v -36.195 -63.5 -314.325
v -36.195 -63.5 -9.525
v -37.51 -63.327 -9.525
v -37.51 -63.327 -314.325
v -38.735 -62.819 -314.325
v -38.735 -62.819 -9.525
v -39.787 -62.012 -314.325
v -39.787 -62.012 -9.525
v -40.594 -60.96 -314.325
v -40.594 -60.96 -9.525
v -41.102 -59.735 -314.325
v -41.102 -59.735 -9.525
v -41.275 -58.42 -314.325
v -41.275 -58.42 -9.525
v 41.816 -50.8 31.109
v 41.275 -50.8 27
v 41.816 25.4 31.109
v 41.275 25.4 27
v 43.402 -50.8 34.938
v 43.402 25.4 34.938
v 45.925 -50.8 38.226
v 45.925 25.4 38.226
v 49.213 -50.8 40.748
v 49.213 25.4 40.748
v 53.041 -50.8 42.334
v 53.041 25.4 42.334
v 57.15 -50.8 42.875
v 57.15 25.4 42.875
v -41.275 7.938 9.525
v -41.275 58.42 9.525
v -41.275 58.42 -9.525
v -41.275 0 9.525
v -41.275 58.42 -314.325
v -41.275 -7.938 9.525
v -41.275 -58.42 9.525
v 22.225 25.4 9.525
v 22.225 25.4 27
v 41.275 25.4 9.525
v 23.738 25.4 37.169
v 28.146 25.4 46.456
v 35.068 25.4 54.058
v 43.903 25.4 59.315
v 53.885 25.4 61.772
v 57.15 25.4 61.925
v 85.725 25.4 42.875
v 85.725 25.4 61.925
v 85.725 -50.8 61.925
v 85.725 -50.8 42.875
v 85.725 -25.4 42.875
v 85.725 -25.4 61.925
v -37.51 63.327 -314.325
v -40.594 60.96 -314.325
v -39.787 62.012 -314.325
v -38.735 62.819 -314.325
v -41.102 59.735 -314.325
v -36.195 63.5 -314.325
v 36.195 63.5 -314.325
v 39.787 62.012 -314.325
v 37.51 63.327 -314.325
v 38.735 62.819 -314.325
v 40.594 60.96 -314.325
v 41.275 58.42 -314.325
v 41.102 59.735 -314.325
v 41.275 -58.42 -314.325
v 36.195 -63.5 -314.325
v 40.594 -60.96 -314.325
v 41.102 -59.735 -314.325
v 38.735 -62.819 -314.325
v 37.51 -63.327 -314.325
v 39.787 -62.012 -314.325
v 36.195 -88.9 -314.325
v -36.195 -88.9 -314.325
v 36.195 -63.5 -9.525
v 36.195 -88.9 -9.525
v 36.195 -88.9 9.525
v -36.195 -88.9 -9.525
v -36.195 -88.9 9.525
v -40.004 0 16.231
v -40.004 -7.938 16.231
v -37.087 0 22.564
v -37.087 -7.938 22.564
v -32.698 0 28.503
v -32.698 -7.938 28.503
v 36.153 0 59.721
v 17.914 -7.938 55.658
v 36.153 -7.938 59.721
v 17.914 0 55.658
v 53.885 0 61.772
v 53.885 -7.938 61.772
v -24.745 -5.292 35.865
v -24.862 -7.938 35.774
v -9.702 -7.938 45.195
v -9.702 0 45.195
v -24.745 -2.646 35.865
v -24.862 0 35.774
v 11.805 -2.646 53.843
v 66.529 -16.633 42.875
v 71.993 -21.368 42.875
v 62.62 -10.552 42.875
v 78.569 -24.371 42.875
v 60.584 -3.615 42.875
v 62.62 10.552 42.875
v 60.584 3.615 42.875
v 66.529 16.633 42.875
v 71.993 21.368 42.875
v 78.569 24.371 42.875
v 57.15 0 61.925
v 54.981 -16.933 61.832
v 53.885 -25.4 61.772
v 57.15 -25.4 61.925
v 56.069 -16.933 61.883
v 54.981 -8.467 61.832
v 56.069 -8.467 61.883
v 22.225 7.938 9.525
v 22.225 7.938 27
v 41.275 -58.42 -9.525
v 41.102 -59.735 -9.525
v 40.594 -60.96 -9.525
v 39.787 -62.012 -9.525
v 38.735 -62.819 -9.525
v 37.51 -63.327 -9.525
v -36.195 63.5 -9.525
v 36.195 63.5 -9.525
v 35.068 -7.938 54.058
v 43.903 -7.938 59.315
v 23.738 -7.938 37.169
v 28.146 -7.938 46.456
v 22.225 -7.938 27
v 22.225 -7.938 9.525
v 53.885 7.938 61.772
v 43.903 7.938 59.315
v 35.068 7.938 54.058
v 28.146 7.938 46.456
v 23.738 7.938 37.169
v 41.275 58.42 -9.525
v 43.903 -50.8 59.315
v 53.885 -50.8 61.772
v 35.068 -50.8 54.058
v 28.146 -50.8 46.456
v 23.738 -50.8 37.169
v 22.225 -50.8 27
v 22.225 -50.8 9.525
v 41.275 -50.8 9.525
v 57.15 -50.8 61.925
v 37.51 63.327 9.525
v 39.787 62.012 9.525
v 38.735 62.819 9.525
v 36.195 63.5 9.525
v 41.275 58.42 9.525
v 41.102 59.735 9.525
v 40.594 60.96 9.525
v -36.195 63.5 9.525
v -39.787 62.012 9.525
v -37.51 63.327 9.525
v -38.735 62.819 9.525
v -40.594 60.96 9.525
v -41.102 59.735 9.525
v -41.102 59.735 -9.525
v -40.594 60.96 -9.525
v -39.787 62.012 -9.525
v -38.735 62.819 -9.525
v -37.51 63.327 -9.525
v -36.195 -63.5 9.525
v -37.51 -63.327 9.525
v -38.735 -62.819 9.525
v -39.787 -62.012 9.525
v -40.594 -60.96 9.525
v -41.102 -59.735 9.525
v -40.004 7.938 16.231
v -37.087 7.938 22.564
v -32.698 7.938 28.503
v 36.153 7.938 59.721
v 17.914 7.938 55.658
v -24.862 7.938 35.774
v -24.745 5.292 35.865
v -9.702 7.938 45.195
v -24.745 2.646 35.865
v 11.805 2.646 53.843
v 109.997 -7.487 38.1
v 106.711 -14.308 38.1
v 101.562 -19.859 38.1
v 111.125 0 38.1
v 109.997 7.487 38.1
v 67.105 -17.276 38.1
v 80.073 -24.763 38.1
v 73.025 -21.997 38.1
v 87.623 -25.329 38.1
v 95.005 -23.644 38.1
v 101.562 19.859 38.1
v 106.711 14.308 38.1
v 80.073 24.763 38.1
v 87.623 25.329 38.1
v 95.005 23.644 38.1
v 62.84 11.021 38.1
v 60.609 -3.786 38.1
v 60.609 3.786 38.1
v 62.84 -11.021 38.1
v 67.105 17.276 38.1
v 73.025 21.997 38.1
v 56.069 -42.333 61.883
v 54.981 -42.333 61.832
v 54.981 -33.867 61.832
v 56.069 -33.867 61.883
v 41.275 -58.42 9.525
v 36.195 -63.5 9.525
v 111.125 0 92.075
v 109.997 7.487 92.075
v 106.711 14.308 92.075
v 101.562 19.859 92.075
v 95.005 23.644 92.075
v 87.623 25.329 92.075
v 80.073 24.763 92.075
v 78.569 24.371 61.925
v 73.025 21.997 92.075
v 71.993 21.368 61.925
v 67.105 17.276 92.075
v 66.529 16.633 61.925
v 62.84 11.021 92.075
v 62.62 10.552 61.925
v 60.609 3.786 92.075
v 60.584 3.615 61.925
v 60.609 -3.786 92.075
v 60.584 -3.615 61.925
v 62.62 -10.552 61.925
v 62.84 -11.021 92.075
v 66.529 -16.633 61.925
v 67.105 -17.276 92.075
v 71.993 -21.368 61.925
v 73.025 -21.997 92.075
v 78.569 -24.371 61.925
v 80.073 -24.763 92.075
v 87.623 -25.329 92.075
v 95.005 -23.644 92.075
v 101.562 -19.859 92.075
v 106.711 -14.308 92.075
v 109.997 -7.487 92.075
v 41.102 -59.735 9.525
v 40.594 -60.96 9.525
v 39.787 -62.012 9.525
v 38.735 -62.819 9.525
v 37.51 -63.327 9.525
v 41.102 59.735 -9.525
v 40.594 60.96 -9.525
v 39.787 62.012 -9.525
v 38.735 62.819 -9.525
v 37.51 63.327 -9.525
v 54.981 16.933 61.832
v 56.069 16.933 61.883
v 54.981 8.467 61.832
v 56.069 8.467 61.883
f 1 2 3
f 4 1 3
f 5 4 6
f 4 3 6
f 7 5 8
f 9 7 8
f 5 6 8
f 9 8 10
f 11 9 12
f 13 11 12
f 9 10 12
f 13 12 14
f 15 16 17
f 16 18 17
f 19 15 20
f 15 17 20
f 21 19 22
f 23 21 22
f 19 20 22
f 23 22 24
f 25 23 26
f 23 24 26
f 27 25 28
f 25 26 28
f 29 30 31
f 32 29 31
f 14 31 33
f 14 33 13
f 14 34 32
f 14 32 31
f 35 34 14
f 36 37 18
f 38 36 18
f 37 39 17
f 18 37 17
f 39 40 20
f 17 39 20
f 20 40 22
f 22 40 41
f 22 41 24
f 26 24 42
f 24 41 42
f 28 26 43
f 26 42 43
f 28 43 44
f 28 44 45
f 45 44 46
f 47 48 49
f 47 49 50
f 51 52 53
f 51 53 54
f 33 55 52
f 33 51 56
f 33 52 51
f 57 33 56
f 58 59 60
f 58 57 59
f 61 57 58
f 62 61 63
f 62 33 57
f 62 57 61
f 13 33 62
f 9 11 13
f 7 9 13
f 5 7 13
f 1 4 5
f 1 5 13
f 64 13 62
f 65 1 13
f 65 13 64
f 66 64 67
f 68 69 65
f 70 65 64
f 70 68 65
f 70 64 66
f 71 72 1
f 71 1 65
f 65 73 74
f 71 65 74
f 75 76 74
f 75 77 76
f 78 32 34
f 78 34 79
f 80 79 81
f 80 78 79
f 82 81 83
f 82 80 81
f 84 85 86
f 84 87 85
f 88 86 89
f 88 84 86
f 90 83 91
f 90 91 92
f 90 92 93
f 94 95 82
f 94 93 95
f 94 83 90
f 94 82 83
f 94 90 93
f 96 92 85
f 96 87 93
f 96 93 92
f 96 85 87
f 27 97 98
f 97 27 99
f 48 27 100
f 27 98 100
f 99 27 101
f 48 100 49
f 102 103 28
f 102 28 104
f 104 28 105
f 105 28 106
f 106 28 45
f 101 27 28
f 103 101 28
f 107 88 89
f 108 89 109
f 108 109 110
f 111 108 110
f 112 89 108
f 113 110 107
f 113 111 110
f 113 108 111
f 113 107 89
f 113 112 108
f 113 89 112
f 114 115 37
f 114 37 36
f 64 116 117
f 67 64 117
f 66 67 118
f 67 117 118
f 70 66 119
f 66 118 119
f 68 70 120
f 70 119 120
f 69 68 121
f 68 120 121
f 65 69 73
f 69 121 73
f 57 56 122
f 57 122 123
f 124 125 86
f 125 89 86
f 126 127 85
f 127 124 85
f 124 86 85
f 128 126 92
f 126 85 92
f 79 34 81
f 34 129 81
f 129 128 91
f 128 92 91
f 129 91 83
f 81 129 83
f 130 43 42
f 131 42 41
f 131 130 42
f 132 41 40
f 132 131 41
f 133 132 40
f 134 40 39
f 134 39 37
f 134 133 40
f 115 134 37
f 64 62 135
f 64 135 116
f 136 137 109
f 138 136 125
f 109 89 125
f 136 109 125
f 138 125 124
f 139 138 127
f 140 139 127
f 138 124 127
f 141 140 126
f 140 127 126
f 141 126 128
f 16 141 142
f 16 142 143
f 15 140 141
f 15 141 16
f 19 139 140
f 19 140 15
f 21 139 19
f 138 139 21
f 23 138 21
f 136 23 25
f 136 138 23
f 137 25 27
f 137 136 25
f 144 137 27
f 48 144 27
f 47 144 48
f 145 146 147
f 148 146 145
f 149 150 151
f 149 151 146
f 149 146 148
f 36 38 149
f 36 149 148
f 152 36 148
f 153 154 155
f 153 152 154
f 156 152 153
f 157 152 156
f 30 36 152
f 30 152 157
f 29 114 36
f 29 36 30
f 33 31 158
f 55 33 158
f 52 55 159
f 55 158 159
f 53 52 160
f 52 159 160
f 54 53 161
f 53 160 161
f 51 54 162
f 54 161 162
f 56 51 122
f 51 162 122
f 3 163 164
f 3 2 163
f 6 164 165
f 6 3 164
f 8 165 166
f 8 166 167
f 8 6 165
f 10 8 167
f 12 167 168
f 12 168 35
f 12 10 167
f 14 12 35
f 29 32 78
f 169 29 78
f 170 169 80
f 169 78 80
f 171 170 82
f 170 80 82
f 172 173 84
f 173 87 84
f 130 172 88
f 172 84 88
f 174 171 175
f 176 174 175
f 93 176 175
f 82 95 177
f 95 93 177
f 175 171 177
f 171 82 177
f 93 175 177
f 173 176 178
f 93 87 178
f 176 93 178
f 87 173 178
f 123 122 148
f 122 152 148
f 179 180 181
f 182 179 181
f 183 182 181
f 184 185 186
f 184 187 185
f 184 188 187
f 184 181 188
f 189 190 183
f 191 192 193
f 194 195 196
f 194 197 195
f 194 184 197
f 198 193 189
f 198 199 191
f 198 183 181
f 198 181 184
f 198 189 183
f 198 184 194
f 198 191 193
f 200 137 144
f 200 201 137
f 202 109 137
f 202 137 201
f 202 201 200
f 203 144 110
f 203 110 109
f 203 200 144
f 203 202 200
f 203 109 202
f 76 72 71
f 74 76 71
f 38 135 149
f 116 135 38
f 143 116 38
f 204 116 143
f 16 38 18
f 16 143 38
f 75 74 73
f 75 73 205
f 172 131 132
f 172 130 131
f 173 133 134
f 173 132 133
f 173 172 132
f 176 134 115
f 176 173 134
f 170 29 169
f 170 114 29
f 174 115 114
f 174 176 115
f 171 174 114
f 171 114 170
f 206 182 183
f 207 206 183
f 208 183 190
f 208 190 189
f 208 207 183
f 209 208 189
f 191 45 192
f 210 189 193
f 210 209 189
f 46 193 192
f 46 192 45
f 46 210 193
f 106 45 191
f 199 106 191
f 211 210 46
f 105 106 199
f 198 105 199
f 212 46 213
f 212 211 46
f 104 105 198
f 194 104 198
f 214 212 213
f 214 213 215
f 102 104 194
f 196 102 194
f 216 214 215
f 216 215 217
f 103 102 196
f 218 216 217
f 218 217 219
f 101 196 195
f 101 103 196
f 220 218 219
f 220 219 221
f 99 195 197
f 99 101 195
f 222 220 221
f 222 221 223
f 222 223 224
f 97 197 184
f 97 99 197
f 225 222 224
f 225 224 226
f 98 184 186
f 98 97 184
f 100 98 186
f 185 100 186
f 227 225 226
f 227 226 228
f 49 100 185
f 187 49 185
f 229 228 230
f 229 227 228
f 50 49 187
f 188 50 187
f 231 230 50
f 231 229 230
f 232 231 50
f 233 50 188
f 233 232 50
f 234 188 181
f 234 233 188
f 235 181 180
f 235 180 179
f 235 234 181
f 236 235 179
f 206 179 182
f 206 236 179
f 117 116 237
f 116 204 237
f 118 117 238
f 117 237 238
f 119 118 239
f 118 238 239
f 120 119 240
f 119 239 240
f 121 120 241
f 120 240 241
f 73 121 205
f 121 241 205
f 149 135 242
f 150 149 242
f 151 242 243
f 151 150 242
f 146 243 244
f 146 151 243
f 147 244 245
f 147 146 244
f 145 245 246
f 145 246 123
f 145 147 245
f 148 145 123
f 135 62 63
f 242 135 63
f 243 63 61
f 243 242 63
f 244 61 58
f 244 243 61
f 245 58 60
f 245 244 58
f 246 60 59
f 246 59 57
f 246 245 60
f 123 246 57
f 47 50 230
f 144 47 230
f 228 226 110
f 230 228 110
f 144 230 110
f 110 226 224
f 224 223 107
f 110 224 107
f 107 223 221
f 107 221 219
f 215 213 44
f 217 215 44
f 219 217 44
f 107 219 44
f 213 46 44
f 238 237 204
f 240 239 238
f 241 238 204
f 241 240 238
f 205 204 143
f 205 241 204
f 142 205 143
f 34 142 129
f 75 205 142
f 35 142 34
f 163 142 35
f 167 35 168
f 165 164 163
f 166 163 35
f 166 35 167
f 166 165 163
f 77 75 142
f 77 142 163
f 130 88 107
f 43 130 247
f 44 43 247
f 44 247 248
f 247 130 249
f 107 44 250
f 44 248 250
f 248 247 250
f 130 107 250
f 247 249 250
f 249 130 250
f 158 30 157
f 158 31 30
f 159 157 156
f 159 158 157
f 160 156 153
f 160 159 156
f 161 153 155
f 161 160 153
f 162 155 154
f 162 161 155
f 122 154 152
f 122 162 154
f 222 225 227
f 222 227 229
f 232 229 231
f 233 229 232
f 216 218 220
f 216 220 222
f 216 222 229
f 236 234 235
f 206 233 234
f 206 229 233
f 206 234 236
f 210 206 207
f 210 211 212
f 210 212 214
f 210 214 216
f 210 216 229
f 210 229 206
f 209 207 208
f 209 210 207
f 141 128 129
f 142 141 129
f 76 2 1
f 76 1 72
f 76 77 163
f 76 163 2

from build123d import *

# Parameters (mm, degrees)
F1_DEPTH = 63.5
F0_W     = 25.4
F0_H     = 19.05
F2_DEPTH = 25.4
F3_DEPTH = 7.9375
F5_R     = 5.08
F6_DEPTH = 25.4
F7_DEPTH = 25.4
F8_DEPTH = 304.8


with BuildPart() as f1:
    # F0 (on Front) → F1 (new body, symmetric)
    with BuildSketch(Plane.XZ):
        Polygon((22.225, 9.525), (-41.275, 9.525), (-41.275, -9.525), (41.275, -9.525), (41.275, 9.525), align=None)
    extrude(amount=F1_DEPTH, both=True)

    # F0 (on Front) → F2 (join, symmetric)
    with BuildSketch(Plane.XZ):
        with BuildLine():
            Line((22.225, 27.0002), (22.225, 9.525))
            Line((22.225, 9.525), (41.275, 9.525))
            Line((41.275, 9.525), (41.275, 27.0002))
            ThreePointArc((41.275, 27.0002), (45.9246798487, 38.2255201513), (57.15, 42.8752))
            Line((57.15, 42.8752), (60.325, 42.8752))
            Line((60.325, 42.8752), (60.325, 61.9252))
            Line((60.325, 61.9252), (57.15, 61.9252))
            add(Edge.make_bspline(
                [(53.8854342407, 61.7722898912), (54.9842067368, 61.8365871986), (56.0728453275, 61.8876096574), (57.15, 61.9252)],
                knots=[108.5245810491, 108.5245810491, 108.5245810491, 108.5245810491, 111.5045361635, 111.5045361635, 111.5045361635, 111.5045361635], degree=3))
            ThreePointArc((53.8854342407, 61.7722898912), (31.3258777096, 50.5133948686), (22.225, 27.0002))
        make_face()
        with Locations((73.025, 52.4002)):
            Rectangle(F0_W, F0_H)
    extrude(amount=F2_DEPTH, both=True)

    # F0 (on Front) → F3 (join, symmetric)
    with BuildSketch(Plane.XZ):
        with BuildLine():
            add(Edge.make_bspline(
                [(-41.275, 9.525), (-39.5856284224, 39.4828766469), (13.870125209, 59.4306981306), (53.8854342407, 61.7722898912)],
                knots=[0, 0, 0, 0, 108.5245810491, 108.5245810491, 108.5245810491, 108.5245810491], degree=3))
            Line((-41.275, 9.525), (22.225, 9.525))
            Line((22.225, 9.525), (22.225, 27.0002))
            ThreePointArc((22.225, 27.0002), (31.3258777096, 50.5133948686), (53.8854342407, 61.7722898912))
        make_face()
    extrude(amount=F3_DEPTH, both=True)

    # F0 (on Front) → F4 (revolve)
    with BuildSketch(Plane.XZ):
        Polygon((85.725, 66.675), (85.725, 61.9252), (85.725, 42.8752), (85.725, 38.1), (111.125, 38.1), (111.125, 66.675), align=None)
    revolve(axis=Axis((85.725, 0, 52.3875), (0, 0, 1)))

    # F5
    f5_edges = [f1.edges().sort_by_distance(p)[0] for p in [
        (41.275, -63.5, 0),
        (-41.275, -63.5, 0),
        (41.275, 63.5, 0),
        (-41.275, 63.5, 0),
    ]]
    fillet(f5_edges, radius=F5_R)

    # F6 (add): a face of the model
    f6_faces = [f1.faces().sort_by_distance(p)[0] for p in [
        (85.725, 0, 66.675),
    ]]
    extrude(f6_faces, amount=F6_DEPTH)

    # F7 (add): faces of the model
    f7_faces = [f1.faces().sort_by_distance(p)[0] for p in [
        (48.8772671015, -25.4, 41.5257592525),
        (0, -63.5, 0),
    ]]
    extrude(f7_faces, amount=F7_DEPTH)

    # F8 (add): a face of the model
    f8_faces = [f1.faces().sort_by_distance(p)[0] for p in [
        (0, -11.3906341446, -9.525),
    ]]
    extrude(f8_faces, amount=F8_DEPTH)


solid = f1.part
